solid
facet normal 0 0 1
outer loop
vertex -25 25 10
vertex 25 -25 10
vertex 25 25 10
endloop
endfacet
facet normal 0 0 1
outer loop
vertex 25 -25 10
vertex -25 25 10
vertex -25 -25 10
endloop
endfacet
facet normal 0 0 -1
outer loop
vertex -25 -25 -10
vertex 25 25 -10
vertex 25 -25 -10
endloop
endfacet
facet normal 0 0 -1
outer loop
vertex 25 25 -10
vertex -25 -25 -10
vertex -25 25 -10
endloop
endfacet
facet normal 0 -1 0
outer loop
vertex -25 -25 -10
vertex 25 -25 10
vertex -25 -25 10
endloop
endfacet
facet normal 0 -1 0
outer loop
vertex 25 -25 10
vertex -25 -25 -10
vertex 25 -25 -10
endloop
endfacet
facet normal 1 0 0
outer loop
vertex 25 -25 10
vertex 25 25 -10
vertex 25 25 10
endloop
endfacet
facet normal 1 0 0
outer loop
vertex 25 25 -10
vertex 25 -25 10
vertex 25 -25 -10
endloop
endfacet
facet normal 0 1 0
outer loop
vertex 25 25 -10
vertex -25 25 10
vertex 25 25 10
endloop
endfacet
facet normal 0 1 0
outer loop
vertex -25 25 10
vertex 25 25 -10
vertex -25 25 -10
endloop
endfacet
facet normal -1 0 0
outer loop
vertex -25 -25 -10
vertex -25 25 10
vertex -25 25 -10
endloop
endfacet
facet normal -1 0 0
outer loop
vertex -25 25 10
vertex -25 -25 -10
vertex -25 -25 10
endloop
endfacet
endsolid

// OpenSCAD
// Basic Project Scaffold for 3D Printing
// This template provides a starting point for beginner projects
// Complete the TODO sections to create your own design

// ============================================
// PROJECT CONFIGURATION
// ============================================

// TODO: Set your project name
projectname = "My First Project";

// TODO: Define overall dimensions (mm)
objectwidth = 50;
objectdepth = 50;
objectheight = 20;

// Wall thickness for strength (2-3mm recommended)
wallthickness = 2;

// ============================================
// MATERIAL PROPERTIES
// ============================================

// Print resolution (0.2mm layers recommended)
$fn = 30;  // Fragment quality (higher = smoother curves, slower rendering)

// ============================================
// MAIN DESIGN
// ============================================

module baseshape() {
    // TODO: Replace this cube with your design
    cube([objectwidth, objectdepth, objectheight], center = true);
}

module hollowversion() {
    // Creates a hollow version by subtracting an inner cube
    difference() {
        baseshape();
        
        // Inner void (adjust padding as needed)
        translate([0, 0, 0.5])
            cube([objectwidth - 2*wallthickness, 
                  objectdepth - 2*wallthickness, 
                  objectheight - 2*wallthickness], 
                 center = true);
    }
}

// ============================================
// OUTPUT OPTIONS
// ============================================

// TODO: Uncomment one of these to see different versions:

// Solid version
baseshape();

// Hollow version (useful for reducing material)
// hollowversion();

// ============================================
// CUSTOMIZATION TIPS
// ============================================
// 1. Test print at small scale first
// 2. Add support structures if needed
// 3. Use wallthickness variable for quick adjustments
// 4. Check dimensions match your design intent
// 5. Consider printing orientation for strength
